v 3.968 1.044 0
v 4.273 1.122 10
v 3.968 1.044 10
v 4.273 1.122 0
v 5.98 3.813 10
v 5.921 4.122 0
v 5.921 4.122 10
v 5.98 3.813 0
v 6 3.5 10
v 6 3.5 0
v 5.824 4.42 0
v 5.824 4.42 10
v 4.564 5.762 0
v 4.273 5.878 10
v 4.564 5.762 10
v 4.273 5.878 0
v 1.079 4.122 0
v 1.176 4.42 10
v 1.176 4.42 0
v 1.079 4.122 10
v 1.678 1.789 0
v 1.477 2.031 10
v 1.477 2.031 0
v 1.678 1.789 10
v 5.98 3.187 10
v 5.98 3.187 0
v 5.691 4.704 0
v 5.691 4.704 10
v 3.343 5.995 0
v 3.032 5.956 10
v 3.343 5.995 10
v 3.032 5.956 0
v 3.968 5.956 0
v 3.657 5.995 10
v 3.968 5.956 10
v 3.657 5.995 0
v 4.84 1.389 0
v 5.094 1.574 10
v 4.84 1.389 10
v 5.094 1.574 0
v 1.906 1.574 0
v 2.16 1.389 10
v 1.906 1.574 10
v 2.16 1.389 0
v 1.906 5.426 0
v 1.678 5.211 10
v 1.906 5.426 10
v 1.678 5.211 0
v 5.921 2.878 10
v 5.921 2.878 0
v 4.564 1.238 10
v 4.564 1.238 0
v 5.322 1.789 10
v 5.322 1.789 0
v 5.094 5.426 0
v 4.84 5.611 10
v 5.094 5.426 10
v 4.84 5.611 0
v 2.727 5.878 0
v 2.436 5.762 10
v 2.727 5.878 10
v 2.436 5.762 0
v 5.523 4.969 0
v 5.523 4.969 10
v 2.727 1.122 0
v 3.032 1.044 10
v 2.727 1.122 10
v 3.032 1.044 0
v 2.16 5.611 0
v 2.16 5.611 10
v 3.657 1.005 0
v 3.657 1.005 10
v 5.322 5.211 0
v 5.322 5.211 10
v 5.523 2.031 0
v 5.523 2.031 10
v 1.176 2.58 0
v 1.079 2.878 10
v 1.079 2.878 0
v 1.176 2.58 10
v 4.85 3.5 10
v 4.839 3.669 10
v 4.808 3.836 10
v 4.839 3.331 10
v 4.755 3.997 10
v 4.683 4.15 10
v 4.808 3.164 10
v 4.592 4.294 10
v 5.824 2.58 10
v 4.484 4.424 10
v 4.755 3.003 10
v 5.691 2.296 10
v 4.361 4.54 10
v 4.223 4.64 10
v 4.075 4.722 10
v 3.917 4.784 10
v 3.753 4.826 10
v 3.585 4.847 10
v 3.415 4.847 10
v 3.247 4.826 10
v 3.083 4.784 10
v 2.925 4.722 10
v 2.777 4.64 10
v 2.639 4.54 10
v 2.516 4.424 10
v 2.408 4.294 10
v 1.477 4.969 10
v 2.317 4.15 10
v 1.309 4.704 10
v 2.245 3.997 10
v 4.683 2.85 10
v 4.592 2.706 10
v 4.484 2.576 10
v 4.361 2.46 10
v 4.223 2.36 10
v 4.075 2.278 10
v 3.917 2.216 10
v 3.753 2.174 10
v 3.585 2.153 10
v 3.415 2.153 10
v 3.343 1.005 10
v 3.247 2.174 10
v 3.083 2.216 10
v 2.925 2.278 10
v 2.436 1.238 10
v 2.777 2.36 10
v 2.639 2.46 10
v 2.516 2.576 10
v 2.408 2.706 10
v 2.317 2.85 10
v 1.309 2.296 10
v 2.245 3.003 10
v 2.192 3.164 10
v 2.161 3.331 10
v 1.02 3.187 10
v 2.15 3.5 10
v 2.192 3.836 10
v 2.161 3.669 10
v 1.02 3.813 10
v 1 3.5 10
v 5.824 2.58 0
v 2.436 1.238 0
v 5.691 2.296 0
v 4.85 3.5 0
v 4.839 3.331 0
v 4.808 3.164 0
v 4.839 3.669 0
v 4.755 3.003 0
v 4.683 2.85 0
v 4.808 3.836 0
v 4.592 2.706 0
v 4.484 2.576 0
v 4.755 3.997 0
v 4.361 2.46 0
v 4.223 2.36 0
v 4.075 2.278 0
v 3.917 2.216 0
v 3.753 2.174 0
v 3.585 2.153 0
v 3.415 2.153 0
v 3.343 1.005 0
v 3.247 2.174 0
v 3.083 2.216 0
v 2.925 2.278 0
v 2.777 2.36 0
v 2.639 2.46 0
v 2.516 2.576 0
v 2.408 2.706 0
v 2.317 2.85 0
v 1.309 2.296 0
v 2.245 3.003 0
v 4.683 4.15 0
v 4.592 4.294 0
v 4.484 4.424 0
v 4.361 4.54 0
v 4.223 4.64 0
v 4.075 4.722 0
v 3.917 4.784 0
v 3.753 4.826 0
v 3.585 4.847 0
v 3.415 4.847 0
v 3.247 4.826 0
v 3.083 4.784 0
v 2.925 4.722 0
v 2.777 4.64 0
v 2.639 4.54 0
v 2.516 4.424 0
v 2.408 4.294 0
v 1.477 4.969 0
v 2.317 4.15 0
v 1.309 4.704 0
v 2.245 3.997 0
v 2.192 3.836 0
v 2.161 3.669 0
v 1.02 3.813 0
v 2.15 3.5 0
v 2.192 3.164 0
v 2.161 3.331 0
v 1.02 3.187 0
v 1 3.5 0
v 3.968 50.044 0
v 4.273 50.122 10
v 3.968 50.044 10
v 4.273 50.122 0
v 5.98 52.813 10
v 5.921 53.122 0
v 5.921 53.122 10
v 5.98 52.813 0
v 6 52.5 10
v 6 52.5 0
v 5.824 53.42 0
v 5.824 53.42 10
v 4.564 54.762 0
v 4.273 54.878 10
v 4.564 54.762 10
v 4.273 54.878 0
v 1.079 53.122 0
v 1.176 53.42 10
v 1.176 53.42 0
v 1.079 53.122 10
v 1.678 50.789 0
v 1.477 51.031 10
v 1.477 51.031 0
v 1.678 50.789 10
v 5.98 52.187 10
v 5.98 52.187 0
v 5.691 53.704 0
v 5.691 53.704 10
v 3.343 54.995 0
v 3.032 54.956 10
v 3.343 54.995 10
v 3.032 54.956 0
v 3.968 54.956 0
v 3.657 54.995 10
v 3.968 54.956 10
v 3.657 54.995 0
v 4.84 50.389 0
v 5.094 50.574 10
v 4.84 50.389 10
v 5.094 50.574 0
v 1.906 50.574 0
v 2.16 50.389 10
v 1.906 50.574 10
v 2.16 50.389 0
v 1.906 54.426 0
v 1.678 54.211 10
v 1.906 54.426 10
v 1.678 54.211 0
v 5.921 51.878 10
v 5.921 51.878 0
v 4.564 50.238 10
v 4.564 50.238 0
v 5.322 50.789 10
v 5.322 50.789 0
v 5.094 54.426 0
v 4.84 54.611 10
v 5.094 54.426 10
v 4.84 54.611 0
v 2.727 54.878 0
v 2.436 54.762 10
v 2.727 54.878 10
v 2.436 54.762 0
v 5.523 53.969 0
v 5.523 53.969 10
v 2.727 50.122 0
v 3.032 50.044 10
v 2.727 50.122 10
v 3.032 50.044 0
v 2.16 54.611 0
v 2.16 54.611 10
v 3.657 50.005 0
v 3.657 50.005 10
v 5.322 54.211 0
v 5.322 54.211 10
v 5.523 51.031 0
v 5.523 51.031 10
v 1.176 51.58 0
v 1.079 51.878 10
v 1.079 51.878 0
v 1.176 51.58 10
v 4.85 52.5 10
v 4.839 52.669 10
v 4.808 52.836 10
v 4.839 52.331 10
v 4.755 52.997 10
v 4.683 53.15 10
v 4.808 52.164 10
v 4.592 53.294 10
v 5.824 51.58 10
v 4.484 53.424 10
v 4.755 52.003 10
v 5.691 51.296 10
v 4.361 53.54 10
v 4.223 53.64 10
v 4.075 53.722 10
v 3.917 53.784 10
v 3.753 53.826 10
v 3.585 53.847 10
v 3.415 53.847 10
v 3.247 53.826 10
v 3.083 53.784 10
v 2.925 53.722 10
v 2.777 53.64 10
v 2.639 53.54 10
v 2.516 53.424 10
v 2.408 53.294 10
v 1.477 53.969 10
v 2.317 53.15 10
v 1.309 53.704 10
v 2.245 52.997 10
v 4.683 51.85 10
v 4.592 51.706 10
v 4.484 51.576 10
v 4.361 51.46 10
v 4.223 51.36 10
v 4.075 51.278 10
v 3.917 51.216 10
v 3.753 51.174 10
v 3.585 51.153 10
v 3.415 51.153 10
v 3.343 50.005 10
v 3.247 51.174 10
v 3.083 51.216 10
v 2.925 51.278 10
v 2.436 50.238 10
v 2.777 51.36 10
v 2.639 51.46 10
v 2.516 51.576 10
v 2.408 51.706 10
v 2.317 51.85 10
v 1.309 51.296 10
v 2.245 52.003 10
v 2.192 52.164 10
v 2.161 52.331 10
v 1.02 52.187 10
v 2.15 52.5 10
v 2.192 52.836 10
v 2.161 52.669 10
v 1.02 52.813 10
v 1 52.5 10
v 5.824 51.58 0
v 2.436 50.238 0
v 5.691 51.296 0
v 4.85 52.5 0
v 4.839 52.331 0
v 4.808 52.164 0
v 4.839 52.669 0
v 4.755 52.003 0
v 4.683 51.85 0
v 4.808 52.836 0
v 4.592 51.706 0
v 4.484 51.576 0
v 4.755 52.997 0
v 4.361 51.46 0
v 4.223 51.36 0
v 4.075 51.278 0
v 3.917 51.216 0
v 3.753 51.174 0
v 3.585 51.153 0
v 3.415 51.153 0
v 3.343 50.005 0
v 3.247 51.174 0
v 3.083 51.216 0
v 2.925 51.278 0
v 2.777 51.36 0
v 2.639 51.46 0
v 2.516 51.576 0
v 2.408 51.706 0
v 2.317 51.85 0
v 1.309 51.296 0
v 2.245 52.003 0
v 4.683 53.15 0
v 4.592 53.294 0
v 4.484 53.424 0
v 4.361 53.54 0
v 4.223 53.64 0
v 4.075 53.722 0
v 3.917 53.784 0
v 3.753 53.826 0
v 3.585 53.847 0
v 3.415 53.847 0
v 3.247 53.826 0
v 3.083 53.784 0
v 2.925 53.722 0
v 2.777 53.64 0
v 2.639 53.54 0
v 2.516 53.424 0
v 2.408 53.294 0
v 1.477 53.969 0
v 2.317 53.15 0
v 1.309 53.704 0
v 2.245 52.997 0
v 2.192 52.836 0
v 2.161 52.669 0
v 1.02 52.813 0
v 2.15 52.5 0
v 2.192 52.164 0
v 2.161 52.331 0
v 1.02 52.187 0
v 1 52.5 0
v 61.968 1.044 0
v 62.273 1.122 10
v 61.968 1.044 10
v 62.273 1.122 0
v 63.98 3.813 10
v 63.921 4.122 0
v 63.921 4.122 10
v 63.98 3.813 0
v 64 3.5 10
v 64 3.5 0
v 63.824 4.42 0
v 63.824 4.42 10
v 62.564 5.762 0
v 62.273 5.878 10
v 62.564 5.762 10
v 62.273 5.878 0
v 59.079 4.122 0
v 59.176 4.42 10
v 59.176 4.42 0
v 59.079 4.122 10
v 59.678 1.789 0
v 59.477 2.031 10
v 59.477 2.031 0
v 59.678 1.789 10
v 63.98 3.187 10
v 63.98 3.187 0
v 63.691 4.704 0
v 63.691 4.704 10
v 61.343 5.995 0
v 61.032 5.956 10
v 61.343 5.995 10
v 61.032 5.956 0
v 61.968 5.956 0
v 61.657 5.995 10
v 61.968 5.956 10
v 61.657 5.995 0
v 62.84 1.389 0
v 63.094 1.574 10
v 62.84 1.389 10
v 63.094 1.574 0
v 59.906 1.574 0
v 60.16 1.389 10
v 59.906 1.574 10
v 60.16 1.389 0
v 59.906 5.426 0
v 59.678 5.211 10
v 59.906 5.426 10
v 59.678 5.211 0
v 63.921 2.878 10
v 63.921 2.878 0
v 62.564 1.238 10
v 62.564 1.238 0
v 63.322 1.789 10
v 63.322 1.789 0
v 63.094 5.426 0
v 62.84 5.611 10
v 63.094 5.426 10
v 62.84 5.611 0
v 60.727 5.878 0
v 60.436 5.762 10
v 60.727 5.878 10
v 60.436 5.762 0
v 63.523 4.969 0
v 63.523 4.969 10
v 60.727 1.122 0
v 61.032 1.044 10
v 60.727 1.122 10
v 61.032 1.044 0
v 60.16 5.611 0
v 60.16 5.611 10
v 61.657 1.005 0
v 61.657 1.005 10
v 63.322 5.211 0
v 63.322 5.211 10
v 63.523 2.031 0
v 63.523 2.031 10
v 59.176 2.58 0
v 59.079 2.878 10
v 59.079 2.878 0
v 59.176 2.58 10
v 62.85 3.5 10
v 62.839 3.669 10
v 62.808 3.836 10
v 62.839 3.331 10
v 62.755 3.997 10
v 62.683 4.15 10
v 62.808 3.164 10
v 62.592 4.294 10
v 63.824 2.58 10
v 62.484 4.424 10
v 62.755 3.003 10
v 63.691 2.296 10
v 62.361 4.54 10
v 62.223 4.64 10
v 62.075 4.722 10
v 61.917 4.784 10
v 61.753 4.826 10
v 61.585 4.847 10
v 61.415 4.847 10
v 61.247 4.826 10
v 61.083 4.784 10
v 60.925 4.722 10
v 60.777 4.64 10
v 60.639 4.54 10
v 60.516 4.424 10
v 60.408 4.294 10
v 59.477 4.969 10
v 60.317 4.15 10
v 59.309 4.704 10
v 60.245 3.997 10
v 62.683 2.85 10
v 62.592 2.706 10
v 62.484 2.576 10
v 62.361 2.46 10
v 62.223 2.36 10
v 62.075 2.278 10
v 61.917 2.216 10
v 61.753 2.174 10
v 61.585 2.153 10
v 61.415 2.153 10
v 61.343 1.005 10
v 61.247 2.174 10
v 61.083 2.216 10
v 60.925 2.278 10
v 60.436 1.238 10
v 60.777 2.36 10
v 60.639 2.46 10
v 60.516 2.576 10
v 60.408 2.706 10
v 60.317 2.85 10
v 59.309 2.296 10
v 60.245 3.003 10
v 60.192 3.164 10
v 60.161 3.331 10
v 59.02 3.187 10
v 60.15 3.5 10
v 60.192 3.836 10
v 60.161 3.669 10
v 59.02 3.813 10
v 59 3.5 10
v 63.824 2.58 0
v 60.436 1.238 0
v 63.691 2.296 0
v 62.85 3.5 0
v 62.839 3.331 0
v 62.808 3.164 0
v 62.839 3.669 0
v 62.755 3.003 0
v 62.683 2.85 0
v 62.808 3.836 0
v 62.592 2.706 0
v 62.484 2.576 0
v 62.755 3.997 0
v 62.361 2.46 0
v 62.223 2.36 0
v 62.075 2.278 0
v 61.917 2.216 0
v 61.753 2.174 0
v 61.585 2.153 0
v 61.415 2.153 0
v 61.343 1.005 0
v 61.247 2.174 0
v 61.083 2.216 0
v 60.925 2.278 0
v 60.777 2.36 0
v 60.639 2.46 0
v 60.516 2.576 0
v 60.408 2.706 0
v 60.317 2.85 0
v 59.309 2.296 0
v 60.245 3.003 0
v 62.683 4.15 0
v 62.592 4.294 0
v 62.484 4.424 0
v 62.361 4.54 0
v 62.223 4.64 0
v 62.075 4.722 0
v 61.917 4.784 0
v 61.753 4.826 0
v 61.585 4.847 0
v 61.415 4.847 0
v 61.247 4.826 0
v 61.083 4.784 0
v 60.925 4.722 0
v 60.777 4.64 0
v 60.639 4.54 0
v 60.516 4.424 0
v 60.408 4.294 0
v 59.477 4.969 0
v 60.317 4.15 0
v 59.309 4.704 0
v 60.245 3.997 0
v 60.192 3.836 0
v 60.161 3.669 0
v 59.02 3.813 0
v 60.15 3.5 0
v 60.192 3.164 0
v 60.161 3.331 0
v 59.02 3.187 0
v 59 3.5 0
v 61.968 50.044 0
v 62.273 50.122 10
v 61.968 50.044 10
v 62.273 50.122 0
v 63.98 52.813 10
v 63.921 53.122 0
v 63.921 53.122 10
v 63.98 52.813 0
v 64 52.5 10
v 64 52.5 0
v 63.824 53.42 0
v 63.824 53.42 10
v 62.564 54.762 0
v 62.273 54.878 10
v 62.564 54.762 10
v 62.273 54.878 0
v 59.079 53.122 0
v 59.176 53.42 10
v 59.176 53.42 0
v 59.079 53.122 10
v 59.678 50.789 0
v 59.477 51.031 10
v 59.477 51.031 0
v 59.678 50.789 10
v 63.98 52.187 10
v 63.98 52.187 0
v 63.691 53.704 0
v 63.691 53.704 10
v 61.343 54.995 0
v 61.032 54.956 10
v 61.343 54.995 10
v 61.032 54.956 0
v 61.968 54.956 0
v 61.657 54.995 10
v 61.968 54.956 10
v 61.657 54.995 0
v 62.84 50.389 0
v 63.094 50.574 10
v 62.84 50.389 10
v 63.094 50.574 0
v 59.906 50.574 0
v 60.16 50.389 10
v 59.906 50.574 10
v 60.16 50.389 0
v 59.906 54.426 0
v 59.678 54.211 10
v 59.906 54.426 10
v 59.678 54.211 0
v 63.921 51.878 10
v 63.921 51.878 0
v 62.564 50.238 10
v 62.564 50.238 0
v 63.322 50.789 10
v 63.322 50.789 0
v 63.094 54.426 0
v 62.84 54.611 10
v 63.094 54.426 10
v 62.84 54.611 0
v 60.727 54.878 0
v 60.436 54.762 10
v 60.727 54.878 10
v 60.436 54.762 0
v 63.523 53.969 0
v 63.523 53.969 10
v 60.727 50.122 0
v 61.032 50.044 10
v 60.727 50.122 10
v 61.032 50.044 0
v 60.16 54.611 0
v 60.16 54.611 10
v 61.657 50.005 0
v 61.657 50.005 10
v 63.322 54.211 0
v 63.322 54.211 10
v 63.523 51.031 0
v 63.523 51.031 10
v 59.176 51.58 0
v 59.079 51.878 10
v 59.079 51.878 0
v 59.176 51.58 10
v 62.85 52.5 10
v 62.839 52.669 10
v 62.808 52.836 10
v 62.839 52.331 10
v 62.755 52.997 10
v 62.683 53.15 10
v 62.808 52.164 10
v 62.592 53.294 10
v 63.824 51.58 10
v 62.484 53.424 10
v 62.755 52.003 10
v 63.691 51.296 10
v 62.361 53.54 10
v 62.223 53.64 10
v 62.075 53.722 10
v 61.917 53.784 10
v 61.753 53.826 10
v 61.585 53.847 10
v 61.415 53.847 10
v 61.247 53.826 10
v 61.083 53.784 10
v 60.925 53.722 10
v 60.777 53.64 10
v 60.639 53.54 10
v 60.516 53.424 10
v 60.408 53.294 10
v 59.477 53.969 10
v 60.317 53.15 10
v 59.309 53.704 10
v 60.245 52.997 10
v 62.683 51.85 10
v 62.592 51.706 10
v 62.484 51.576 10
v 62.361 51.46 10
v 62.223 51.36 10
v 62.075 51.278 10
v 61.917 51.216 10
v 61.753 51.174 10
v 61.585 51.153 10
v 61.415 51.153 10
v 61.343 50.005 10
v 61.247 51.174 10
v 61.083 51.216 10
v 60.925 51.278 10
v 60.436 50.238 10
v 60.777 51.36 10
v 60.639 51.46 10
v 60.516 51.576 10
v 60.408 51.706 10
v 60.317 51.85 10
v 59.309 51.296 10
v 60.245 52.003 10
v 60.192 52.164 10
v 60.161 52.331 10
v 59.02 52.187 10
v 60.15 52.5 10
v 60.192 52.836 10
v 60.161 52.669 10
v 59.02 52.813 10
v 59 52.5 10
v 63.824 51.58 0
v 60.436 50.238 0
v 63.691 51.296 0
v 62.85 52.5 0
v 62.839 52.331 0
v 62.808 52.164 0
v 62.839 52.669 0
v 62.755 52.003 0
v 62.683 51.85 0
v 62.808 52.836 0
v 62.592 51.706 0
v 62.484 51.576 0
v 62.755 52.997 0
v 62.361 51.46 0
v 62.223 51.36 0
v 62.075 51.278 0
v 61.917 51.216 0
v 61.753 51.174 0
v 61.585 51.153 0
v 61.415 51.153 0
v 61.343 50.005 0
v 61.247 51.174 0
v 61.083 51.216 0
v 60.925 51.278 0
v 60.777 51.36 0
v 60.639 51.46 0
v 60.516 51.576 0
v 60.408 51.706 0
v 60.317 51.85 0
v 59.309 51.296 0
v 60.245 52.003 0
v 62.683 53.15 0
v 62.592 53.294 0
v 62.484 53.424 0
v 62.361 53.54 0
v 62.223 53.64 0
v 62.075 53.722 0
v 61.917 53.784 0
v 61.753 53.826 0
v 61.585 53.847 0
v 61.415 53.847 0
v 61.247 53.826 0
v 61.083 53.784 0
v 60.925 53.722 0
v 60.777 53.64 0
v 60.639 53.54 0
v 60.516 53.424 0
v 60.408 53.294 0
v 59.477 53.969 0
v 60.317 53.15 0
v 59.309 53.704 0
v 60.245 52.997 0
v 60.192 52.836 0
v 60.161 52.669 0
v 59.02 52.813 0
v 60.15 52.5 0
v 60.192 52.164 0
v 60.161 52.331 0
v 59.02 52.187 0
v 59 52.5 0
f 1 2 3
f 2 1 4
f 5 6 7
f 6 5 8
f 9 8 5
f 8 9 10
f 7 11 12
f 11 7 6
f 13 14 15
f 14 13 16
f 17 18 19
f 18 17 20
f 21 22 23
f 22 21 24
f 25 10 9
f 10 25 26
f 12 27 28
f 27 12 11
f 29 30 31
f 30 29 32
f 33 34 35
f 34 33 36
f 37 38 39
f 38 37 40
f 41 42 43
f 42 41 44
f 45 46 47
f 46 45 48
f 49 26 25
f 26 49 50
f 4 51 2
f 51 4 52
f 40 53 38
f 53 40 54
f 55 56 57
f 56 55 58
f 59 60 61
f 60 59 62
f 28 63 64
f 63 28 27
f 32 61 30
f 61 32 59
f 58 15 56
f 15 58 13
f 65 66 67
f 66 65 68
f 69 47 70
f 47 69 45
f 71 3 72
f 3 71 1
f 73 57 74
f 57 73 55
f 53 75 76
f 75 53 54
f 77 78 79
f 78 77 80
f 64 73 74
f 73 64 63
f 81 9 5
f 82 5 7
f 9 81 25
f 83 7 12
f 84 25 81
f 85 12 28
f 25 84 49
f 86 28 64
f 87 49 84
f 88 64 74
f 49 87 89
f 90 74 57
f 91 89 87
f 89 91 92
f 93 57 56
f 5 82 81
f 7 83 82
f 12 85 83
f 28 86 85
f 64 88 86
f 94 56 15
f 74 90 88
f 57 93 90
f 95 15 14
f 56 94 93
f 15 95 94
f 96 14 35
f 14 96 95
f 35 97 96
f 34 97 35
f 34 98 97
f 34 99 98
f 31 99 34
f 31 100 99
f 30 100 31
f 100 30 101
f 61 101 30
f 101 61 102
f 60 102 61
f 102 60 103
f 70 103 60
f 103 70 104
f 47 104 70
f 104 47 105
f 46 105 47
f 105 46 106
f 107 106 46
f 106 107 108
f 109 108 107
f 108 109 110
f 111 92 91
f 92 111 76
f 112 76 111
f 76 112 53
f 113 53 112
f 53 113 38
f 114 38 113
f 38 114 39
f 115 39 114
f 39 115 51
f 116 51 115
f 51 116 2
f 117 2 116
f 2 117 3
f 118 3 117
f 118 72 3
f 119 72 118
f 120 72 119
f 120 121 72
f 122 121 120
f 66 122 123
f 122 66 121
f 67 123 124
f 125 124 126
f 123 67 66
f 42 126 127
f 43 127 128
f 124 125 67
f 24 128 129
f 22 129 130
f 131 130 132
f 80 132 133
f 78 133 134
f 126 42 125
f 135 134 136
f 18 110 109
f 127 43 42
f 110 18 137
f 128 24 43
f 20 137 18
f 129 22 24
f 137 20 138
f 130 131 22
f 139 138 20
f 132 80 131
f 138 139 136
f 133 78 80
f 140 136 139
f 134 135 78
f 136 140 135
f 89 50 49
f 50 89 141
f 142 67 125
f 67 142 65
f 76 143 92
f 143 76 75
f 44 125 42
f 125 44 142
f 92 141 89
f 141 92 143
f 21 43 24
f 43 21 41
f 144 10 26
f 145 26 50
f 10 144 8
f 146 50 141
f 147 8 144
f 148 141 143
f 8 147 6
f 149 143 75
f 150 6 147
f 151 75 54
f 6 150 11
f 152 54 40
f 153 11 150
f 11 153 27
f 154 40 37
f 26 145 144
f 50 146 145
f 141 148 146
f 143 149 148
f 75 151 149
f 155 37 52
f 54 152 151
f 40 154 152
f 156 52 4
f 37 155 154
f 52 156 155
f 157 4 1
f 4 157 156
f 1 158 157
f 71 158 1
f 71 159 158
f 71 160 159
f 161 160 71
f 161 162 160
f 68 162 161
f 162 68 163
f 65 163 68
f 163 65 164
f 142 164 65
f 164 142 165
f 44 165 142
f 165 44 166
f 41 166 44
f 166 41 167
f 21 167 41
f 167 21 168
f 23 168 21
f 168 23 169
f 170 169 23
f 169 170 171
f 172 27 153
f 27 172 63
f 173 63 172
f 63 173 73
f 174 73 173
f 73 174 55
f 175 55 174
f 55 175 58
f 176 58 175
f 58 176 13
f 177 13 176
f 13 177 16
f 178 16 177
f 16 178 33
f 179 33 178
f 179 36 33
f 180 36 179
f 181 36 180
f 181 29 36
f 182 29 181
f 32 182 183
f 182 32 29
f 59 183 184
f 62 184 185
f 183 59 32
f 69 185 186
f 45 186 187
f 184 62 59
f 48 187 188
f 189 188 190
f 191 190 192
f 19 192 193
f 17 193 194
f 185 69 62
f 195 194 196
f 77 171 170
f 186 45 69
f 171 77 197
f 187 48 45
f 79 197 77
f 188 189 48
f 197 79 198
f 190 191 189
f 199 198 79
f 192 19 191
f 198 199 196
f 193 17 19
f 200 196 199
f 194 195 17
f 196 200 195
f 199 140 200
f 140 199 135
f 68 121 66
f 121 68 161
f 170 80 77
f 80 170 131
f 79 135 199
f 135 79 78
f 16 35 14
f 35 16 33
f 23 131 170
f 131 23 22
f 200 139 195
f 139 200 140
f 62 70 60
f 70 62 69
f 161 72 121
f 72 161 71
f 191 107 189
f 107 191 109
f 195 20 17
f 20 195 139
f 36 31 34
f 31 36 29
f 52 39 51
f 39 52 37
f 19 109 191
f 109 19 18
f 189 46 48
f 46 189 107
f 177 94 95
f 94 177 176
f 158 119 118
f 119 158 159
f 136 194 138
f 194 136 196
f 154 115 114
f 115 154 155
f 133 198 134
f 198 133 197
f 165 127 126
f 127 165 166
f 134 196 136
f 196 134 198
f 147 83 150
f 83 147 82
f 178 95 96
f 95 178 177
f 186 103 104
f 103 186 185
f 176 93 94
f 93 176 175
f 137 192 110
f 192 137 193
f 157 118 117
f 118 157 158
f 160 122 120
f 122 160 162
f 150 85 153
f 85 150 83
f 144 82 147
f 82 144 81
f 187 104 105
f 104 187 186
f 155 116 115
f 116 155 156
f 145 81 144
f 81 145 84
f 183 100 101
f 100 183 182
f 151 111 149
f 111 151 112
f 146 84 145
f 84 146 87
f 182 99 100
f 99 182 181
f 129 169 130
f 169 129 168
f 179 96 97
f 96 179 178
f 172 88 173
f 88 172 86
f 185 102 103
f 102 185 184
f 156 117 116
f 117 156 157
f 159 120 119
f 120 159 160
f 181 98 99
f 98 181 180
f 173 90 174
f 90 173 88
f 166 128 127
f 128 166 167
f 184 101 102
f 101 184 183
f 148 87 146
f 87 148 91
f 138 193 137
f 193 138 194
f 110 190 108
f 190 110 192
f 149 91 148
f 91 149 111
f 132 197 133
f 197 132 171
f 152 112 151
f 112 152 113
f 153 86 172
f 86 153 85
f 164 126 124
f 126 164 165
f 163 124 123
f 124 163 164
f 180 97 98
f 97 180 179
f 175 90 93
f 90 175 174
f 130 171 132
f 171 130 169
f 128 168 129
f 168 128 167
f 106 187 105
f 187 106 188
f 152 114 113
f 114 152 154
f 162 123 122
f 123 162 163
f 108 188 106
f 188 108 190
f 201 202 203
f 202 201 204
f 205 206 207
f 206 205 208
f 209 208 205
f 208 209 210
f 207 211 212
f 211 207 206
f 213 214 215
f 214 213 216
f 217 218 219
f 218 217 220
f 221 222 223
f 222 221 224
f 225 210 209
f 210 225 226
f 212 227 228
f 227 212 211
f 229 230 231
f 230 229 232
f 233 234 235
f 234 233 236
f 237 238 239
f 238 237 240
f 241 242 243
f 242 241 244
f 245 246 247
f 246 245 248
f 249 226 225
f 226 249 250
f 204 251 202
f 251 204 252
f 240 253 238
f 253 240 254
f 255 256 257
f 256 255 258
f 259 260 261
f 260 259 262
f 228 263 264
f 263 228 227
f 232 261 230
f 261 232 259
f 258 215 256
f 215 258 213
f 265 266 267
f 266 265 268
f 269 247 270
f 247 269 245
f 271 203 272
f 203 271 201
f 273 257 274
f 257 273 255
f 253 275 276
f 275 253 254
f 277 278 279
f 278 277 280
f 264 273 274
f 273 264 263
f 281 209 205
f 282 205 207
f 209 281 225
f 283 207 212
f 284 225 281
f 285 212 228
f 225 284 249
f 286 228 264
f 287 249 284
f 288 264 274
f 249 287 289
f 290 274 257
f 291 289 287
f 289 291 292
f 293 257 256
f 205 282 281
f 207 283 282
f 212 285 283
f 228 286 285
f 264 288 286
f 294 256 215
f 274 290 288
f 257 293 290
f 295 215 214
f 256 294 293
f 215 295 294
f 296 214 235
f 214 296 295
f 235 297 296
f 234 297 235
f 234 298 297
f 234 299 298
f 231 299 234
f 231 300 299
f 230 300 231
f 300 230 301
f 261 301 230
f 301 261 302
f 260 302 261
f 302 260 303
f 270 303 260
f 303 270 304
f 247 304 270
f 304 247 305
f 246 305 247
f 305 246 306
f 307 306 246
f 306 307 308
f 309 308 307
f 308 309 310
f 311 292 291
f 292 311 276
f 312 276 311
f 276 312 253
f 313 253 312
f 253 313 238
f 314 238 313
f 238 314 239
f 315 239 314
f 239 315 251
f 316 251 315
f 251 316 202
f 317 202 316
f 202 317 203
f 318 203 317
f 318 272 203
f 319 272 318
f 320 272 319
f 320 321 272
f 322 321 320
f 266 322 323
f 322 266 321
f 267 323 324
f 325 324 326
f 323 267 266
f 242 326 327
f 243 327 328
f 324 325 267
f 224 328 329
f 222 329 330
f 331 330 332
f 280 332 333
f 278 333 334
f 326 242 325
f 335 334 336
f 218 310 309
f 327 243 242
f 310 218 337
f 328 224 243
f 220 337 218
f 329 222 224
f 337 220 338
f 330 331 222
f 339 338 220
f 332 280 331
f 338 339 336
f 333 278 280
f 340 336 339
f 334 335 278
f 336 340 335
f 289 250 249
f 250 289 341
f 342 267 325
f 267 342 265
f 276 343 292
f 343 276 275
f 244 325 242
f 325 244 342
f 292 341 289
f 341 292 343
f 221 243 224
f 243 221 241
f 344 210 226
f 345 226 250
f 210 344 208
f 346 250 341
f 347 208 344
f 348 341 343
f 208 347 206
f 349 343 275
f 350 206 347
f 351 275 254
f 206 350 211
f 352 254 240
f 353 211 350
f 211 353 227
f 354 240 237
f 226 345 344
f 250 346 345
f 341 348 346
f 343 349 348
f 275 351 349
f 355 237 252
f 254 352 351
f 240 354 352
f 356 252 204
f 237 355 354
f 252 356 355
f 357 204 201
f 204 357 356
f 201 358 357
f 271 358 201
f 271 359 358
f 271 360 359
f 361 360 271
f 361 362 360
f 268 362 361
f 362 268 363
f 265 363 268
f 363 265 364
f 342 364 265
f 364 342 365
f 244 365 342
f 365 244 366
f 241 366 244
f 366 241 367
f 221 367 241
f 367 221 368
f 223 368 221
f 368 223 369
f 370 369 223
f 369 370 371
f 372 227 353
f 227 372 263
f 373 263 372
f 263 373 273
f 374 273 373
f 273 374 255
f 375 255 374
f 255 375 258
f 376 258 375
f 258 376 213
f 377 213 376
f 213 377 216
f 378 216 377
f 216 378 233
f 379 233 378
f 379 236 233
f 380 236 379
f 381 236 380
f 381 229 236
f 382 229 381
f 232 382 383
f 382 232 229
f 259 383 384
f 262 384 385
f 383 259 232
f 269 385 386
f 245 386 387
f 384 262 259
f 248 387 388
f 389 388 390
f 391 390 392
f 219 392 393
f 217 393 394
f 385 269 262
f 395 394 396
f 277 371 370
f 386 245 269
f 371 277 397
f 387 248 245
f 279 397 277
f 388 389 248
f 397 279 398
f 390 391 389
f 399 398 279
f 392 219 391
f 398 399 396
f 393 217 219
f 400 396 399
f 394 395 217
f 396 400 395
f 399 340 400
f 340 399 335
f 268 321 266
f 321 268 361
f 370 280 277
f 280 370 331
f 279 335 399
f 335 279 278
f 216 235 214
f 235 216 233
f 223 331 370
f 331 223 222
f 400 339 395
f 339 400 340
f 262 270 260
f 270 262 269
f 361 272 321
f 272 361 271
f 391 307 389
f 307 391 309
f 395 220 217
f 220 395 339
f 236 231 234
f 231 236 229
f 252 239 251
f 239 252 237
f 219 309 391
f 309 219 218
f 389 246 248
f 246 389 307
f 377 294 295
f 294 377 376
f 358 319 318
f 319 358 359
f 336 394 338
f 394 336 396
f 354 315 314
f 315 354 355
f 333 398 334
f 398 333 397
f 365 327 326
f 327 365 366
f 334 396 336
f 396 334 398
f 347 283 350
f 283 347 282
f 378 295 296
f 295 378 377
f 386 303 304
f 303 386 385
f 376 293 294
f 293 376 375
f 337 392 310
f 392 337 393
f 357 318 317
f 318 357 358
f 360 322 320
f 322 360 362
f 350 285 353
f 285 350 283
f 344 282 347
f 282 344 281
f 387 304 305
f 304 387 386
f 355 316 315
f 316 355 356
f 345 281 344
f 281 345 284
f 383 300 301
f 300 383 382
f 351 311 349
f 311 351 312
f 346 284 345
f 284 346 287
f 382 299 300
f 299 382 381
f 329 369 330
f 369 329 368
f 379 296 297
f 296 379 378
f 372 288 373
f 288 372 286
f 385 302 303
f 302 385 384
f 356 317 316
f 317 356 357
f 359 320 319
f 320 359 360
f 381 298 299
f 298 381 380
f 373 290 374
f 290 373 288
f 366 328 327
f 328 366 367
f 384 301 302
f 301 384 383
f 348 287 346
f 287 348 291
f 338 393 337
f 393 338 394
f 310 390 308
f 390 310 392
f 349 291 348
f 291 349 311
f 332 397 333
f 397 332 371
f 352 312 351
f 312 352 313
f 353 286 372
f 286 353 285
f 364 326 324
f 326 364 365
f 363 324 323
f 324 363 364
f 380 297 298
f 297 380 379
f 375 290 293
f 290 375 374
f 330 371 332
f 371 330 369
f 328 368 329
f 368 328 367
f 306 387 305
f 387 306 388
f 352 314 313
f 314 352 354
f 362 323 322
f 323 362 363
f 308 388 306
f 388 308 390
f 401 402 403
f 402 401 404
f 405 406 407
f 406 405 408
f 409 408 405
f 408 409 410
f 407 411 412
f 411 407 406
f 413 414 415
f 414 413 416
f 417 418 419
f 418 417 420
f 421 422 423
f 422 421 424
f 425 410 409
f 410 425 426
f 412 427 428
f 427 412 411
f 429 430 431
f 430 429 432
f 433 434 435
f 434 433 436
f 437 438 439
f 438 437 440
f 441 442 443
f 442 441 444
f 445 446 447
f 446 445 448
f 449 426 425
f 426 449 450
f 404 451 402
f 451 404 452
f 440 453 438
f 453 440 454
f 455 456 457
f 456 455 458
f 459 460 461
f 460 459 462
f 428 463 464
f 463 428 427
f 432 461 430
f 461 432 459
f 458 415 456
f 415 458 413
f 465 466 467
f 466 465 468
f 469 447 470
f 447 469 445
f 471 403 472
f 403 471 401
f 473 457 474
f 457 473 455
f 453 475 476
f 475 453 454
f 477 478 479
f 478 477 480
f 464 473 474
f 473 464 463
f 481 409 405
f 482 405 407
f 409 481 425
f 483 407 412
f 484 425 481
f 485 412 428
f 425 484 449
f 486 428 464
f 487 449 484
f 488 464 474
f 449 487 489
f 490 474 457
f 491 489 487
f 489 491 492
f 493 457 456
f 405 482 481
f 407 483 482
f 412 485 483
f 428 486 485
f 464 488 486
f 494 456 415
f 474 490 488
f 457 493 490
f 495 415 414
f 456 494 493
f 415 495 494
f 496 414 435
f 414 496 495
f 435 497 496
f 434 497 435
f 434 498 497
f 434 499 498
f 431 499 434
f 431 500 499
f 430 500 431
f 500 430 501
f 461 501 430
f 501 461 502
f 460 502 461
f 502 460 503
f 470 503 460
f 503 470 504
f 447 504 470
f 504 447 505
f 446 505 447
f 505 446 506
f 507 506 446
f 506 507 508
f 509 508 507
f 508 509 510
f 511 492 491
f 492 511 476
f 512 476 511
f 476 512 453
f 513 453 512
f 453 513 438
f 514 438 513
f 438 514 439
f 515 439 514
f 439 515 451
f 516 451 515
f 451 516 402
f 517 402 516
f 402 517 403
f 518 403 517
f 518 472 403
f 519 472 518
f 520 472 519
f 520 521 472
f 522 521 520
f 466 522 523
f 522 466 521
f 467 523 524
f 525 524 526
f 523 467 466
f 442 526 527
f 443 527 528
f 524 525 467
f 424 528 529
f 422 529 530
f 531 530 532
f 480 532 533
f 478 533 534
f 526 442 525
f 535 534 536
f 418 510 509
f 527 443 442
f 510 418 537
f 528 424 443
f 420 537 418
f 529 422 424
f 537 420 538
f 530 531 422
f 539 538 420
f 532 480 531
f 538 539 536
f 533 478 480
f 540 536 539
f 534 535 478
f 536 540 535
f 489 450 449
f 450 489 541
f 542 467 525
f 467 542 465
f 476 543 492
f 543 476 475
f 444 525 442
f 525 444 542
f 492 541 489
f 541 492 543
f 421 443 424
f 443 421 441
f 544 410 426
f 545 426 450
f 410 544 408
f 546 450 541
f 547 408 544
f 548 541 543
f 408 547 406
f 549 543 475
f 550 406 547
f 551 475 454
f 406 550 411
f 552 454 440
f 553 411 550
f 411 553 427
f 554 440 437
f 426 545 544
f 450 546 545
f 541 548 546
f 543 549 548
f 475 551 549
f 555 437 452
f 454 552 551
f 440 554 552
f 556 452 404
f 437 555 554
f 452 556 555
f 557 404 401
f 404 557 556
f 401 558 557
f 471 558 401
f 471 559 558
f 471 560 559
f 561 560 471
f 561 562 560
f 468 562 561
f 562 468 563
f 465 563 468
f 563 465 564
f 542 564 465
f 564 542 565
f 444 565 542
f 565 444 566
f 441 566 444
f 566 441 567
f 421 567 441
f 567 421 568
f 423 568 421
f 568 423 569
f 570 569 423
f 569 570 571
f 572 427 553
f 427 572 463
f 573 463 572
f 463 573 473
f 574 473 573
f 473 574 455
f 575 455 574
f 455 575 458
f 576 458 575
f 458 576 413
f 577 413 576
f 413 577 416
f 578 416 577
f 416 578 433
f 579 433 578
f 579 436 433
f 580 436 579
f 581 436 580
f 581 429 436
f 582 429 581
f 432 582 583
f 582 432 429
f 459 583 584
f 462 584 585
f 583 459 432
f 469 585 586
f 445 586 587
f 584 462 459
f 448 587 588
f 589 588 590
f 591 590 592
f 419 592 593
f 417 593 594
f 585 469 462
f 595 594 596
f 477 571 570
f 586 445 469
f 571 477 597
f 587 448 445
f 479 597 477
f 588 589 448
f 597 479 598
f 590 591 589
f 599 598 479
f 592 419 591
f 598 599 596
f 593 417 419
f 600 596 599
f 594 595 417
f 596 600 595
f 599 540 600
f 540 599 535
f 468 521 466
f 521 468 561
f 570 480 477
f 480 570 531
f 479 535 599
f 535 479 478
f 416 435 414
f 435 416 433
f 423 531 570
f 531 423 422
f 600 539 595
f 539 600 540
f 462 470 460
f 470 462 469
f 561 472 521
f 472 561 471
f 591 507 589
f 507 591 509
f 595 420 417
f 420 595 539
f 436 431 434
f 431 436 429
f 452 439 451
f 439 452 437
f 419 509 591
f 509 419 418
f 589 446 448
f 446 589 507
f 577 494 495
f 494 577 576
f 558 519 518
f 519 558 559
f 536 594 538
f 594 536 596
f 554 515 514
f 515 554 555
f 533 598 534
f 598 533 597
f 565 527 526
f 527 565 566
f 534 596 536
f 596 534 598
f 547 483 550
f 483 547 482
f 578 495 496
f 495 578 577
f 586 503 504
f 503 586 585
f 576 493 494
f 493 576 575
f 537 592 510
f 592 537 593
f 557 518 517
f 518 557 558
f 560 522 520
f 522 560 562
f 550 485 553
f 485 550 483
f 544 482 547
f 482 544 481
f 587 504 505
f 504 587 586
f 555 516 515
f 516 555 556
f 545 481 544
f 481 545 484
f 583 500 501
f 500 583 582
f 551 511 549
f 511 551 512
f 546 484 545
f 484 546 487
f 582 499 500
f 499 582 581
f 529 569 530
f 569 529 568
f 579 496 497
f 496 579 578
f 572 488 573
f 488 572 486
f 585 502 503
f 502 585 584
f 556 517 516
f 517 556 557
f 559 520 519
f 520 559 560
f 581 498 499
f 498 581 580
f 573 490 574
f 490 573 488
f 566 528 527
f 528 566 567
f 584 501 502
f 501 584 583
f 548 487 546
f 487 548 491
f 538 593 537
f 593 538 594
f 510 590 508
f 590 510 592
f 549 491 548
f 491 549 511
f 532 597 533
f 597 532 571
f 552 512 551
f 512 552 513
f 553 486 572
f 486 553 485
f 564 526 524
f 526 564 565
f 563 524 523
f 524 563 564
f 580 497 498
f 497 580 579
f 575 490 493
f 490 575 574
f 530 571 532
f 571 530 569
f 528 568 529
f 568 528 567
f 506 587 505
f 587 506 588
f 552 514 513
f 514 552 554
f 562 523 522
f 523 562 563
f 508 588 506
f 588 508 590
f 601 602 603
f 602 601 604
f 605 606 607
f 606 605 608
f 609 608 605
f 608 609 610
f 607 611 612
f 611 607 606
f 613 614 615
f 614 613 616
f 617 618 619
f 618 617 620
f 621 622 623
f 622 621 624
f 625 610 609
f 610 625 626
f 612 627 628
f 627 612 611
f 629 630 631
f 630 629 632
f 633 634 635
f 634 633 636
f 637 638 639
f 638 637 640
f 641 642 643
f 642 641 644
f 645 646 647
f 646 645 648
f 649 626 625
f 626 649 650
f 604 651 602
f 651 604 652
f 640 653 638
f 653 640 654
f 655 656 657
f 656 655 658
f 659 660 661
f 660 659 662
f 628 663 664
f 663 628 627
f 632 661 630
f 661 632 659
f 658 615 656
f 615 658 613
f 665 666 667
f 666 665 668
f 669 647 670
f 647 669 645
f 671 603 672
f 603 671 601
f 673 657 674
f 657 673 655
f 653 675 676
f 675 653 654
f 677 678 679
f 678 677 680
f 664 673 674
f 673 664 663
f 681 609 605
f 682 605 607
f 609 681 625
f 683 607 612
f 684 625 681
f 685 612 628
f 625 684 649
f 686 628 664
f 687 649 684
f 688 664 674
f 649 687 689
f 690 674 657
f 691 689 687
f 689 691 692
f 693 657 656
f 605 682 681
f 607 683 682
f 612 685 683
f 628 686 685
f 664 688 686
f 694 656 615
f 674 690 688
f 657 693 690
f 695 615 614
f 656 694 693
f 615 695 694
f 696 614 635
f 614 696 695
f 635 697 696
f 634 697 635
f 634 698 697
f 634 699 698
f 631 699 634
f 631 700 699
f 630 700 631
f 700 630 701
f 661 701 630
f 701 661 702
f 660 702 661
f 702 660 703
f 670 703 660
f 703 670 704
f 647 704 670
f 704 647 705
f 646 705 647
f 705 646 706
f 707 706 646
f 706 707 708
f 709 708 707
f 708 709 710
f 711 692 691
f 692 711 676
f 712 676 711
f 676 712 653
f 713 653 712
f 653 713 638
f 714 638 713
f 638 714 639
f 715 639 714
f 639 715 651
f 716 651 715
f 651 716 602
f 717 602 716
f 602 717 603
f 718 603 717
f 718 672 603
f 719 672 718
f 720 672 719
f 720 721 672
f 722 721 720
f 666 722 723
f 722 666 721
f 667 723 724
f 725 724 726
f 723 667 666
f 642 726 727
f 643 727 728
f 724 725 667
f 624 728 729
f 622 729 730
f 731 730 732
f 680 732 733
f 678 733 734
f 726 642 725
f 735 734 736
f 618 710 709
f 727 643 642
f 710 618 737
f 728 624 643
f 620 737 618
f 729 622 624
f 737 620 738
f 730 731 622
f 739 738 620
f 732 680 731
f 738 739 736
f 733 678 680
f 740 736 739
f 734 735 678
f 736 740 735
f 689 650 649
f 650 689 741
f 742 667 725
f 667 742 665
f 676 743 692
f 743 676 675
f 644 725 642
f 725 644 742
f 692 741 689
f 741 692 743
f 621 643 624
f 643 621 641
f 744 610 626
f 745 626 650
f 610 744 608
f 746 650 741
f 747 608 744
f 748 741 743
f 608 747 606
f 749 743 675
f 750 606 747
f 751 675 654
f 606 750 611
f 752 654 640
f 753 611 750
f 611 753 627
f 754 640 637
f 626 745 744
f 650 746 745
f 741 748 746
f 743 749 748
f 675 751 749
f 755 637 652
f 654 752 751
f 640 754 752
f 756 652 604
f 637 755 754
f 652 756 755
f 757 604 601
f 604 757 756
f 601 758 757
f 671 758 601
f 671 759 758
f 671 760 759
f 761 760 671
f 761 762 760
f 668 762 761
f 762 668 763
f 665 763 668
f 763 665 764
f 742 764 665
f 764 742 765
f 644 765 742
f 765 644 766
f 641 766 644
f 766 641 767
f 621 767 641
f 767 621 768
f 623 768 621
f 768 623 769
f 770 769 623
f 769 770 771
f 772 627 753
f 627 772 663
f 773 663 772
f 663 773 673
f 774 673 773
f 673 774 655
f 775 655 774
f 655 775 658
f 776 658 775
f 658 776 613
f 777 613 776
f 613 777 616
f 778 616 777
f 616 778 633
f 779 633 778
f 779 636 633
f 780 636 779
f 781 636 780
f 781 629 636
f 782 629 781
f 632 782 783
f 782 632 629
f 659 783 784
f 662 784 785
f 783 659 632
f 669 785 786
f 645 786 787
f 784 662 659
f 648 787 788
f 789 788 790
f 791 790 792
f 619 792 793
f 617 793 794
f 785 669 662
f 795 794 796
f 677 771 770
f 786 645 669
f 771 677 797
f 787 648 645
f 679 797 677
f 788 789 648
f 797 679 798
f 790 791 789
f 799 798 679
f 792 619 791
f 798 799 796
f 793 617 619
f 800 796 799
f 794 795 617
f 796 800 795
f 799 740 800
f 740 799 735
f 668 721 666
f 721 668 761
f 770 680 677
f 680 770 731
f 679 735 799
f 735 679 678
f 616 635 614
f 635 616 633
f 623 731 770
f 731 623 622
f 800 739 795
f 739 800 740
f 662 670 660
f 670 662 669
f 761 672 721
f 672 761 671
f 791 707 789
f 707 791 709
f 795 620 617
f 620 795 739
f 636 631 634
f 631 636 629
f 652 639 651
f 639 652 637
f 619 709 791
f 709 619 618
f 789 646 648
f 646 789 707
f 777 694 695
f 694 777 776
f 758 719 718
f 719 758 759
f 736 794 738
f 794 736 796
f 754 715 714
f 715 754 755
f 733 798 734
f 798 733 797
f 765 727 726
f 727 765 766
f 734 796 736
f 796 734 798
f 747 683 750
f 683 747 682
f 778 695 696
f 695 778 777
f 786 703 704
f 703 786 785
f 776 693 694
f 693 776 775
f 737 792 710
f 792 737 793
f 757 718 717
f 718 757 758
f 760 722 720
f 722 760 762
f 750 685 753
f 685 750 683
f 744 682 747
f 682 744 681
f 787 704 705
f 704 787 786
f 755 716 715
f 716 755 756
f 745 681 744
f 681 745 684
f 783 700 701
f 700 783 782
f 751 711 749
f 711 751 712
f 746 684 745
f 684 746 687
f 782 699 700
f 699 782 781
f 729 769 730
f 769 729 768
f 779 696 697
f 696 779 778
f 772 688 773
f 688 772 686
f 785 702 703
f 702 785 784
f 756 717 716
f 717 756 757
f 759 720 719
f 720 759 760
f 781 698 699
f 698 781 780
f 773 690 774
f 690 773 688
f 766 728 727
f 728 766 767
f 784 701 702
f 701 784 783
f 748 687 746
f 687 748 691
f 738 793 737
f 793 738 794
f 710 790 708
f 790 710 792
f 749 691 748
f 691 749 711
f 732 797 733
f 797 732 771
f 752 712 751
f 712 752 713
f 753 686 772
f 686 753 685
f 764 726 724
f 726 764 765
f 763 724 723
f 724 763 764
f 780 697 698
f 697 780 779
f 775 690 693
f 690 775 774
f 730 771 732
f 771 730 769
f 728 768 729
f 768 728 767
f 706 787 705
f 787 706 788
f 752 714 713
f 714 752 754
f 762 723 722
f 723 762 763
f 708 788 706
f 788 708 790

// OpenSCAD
linear_extrude(2)
	import("../dxf/RPi_3B.dxf", $fn=50);

//support fo 2.5mm scolls
translate([3.5,3.5,0])
difference(){
		cylinder(10,2.5,2.5, $fn=50);
		cylinder(12,1.35,1.35, $fn=50);
}

translate([3.5,52.5,0])
difference(){
		cylinder(10,2.5,2.5, $fn=50);
		cylinder(12,1.35,1.35, $fn=50);
}

translate([61.5,3.5,0])
difference(){
		cylinder(10,2.5,2.5, $fn=50);
		cylinder(12,1.35,1.35, $fn=50);
}

translate([61.5,52.5,0])
difference(){
		cylinder(10,2.5,2.5, $fn=50);
		cylinder(12,1.35,1.35, $fn=50);
}
